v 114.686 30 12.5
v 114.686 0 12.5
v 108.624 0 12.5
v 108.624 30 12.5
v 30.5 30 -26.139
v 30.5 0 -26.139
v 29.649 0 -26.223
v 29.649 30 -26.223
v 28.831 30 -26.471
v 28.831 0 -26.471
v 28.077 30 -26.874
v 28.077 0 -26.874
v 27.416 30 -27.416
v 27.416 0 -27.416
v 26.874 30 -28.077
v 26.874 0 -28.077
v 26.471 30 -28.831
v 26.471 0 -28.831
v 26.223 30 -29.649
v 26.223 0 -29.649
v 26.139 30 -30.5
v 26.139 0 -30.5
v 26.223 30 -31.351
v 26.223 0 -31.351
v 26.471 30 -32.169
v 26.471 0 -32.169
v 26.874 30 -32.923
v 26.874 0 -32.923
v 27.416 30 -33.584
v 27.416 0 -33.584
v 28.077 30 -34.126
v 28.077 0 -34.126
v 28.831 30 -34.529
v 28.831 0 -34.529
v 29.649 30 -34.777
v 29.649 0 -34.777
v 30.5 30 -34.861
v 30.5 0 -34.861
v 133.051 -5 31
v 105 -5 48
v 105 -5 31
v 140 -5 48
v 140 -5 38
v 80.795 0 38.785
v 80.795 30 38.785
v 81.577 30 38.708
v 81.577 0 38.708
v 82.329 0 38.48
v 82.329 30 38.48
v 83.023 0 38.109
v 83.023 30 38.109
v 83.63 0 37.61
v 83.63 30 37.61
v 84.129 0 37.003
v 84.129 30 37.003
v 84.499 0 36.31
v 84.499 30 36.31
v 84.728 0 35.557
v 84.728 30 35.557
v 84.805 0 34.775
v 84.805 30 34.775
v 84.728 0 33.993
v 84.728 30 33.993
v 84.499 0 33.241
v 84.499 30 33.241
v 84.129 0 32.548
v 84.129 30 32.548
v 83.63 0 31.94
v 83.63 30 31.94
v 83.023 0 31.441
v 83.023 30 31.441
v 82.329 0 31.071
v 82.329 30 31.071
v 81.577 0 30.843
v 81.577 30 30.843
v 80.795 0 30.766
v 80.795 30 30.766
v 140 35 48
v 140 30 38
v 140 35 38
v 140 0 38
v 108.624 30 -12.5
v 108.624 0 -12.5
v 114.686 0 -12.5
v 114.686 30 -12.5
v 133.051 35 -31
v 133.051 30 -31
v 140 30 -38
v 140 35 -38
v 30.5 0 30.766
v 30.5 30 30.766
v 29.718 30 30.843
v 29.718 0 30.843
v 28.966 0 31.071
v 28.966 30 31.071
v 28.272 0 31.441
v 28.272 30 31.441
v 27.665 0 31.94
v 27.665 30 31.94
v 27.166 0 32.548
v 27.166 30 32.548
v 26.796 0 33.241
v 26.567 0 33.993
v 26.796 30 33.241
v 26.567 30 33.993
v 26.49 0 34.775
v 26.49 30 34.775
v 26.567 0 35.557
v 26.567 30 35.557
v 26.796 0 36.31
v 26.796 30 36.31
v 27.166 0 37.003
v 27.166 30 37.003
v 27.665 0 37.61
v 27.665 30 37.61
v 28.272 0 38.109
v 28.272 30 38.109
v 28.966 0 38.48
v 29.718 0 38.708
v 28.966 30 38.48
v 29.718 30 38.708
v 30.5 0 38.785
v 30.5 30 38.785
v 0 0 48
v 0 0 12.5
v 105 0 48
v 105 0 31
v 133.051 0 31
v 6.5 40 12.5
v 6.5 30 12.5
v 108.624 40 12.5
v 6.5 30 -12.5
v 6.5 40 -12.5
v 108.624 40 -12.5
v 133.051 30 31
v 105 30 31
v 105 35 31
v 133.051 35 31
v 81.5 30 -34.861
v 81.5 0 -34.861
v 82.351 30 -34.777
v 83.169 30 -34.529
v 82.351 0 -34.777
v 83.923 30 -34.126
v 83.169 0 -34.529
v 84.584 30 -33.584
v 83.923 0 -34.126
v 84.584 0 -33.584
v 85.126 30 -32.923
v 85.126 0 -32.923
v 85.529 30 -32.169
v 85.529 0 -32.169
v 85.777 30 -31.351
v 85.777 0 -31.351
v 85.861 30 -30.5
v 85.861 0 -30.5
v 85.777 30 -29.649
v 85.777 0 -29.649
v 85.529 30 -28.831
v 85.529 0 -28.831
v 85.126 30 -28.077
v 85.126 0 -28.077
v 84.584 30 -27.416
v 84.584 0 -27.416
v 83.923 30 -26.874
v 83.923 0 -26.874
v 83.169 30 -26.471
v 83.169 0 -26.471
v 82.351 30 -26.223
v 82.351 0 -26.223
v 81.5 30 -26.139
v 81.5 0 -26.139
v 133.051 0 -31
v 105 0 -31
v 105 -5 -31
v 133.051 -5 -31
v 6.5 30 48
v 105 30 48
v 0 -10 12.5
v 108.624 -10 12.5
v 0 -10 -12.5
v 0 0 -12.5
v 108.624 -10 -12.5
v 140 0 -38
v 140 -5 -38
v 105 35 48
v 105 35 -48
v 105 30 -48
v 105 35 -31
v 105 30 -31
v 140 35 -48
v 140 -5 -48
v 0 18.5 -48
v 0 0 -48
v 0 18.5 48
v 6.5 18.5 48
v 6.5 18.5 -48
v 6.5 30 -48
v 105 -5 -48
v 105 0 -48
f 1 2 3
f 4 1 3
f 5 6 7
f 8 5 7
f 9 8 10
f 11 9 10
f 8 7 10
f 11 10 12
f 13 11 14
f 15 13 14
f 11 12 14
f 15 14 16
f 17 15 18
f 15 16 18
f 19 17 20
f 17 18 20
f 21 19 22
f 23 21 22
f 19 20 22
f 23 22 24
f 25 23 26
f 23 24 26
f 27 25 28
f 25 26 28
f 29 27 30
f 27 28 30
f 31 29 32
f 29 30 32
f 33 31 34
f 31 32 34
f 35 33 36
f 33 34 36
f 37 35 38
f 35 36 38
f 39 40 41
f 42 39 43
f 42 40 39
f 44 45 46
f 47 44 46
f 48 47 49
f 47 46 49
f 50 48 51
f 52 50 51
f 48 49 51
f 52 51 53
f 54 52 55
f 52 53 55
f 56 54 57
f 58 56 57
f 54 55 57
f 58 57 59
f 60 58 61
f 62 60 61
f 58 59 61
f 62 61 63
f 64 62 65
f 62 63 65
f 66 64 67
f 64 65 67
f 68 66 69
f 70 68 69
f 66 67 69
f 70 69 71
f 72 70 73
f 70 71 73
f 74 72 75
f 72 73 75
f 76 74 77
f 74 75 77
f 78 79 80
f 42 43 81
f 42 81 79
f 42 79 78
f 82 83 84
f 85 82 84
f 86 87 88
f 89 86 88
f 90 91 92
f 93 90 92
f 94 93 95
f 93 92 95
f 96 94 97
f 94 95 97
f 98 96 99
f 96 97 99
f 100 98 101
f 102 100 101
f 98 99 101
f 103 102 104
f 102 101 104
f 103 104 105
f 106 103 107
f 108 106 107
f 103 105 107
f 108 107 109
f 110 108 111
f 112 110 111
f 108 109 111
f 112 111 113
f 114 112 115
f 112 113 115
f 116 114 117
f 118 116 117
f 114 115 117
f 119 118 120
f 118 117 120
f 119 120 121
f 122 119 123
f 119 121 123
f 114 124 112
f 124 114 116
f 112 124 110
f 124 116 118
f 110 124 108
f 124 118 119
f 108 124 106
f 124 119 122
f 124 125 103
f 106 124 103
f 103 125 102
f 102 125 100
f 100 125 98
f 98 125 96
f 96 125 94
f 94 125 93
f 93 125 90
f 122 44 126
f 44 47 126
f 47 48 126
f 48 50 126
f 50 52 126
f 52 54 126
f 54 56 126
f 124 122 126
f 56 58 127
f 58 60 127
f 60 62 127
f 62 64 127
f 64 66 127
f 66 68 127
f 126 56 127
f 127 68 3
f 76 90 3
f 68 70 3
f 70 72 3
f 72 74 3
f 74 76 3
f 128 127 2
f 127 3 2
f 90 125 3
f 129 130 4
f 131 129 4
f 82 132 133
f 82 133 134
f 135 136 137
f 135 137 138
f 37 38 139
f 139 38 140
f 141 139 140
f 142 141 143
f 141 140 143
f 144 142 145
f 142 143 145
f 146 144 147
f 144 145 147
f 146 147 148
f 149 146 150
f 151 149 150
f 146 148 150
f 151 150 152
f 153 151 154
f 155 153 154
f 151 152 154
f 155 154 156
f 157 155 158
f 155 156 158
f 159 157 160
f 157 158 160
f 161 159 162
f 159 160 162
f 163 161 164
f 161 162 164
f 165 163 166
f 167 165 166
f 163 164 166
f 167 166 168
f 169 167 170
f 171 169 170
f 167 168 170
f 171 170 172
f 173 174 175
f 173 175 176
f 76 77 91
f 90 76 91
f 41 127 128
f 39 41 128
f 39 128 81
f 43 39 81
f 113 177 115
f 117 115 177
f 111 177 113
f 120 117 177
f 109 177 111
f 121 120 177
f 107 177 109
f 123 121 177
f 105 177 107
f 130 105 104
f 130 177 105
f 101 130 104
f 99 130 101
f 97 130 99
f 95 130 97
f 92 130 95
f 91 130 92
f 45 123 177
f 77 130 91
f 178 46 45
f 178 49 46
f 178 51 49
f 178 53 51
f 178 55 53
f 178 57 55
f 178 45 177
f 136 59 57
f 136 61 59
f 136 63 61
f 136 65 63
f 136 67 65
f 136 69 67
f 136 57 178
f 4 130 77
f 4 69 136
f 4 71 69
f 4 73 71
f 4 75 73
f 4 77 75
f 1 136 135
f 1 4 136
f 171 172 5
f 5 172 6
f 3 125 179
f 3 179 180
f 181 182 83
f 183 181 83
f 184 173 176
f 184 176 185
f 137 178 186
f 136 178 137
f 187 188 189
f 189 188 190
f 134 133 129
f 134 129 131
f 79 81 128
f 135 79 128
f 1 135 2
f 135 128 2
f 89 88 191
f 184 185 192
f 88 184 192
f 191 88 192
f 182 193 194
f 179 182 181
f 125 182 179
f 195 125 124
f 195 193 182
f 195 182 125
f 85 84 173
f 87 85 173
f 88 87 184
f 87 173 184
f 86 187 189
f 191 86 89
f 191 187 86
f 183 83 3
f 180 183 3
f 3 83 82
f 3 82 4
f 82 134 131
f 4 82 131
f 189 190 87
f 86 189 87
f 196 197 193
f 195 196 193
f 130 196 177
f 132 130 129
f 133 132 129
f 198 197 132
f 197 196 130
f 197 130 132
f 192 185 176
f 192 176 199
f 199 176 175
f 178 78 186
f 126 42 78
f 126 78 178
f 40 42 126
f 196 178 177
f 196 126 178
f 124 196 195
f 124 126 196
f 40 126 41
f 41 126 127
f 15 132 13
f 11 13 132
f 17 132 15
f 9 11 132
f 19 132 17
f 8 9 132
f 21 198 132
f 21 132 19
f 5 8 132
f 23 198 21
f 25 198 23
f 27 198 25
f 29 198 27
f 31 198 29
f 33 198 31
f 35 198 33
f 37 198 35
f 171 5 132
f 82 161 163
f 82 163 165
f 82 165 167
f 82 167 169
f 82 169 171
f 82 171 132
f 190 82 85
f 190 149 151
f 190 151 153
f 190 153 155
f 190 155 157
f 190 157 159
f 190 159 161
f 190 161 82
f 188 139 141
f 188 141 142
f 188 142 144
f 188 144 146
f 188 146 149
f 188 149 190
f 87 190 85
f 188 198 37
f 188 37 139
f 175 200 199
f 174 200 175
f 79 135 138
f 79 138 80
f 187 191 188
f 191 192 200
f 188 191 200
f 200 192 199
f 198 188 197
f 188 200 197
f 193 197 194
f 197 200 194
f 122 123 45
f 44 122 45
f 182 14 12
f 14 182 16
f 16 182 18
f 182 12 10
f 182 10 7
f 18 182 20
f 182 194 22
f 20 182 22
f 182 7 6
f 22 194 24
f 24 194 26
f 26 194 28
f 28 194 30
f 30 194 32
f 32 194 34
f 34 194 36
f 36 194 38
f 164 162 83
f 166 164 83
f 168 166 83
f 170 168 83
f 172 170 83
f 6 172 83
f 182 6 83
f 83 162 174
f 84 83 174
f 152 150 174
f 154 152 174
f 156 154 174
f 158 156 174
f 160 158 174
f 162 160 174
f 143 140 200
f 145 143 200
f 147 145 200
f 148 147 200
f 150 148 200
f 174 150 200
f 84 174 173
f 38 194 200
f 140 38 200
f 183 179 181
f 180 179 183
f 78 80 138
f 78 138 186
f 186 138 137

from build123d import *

# Parameters (mm, degrees)
BOSS_EXTRUDE3_DEPTH     = 30
SKETCH3_W               = 108.623523344
SKETCH3_H               = 25
BOSS_EXTRUDE4_DEPTH     = 10
CUT_EXTRUDE2_DEPTH      = 152.009933448
CUT_EXTRUDE2_DEPTH_BACK = 152.009933448
SKETCH5_W               = 108.623523344
SKETCH5_H               = 25
BOSS_EXTRUDE5_DEPTH     = 10
CUT_EXTRUDE3_DEPTH      = 154.310143174
CUT_EXTRUDE3_DEPTH_BACK = 154.310143174
BOSS_EXTRUDE6_DEPTH     = 5
BOSS_EXTRUDE7_DEPTH     = 5
BOSS_EXTRUDE8_DEPTH     = 5
CUT_EXTRUDE4_REACH      = 176.402
SKETCH22_W              = 6.5
SKETCH22_H              = 11.5
SKETCH23_W              = 6.5
SKETCH23_H              = 10
CUT_EXTRUDE5_DEPTH      = 158.671335378


with BuildPart() as part:
    # Sketch1 → Boss-Extrude3 (new body)
    with BuildSketch(Plane(origin=(0, 0, 0), x_dir=(1, 0, 0), z_dir=(0, 1, 0))):
        Polygon((0, -48), (105, -48), (140, -48), (140, -38), (114.68589492, -12.5), (108.623523344, -12.5), (108.623523344, 12.5), (114.68589492, 12.5), (140, 38), (140, 48), (0, 48), align=None)
    extrude(amount=BOSS_EXTRUDE3_DEPTH)

    # Sketch3 → Boss-Extrude4 (add)
    with BuildSketch(Plane(origin=(0, 30, 0), x_dir=(1, 0, 0), z_dir=(0, 1, 0))):
        with Locations((54.311761672, 0)):
            Rectangle(SKETCH3_W, SKETCH3_H)
    extrude(amount=BOSS_EXTRUDE4_DEPTH)

    # Sketch4 → Cut-Extrude2 (cut, two sides: drawn at the far end of the back side and taken through both)
    with BuildSketch(Plane(origin=(0, 30, 0), x_dir=(1, 0, 0), z_dir=(0, 1, 0)).offset(-CUT_EXTRUDE2_DEPTH_BACK)):
        with BuildLine():
            Line((30.5, 34.860728985), (81.5, 34.860728985))
            ThreePointArc((81.5, 34.860728985), (85.860728985, 30.5), (81.5, 26.139271015))
            Line((81.5, 26.139271015), (30.5, 26.139271015))
            ThreePointArc((30.5, 26.139271015), (26.139271015, 30.5), (30.5, 34.860728985))
        make_face()
    extrude(amount=CUT_EXTRUDE2_DEPTH + CUT_EXTRUDE2_DEPTH_BACK, mode=Mode.SUBTRACT)

    # Sketch5 → Boss-Extrude5 (add)
    with BuildSketch(Plane.XZ):
        with Locations((54.311761672, 0)):
            Rectangle(SKETCH5_W, SKETCH5_H)
    extrude(amount=BOSS_EXTRUDE5_DEPTH)

    # Sketch6 → Cut-Extrude3 (cut, two sides: drawn at the far end of the back side and taken through both)
    with BuildSketch(Plane.XZ.offset(-CUT_EXTRUDE3_DEPTH_BACK)):
        with BuildLine():
            Line((30.5, 38.784818055), (80.79497918, 38.784818055))
            ThreePointArc((80.79497918, 38.784818055), (84.804542876, 34.77525436), (80.79497918, 30.765690664))
            Line((80.79497918, 30.765690664), (30.5, 30.765690664))
            ThreePointArc((30.5, 30.765690664), (26.490436304, 34.77525436), (30.5, 38.784818055))
        make_face()
    extrude(amount=CUT_EXTRUDE3_DEPTH + CUT_EXTRUDE3_DEPTH_BACK, mode=Mode.SUBTRACT)

    # Sketch10 → Boss-Extrude6 (add)
    with BuildSketch(Plane(origin=(0, 30, 0), x_dir=(1, 0, 0), z_dir=(0, 1, 0))):
        Polygon((140, 48), (105, 48), (105, 31), (133.051029978, 31), (140, 38), align=None)
    extrude(amount=BOSS_EXTRUDE6_DEPTH)

    # Sketch12 → Boss-Extrude7 (add)
    with BuildSketch(Plane.XZ):
        Polygon((140, 48), (105, 48), (105, 31), (133.051029978, 31), (140, 38), align=None)
        Polygon((105, -48), (105, -31), (133.051029978, -31), (140, -38), (140, -48), align=None)
    extrude(amount=BOSS_EXTRUDE7_DEPTH)

    # Sketch13 → Boss-Extrude8 (add)
    with BuildSketch(Plane(origin=(0, 30, 0), x_dir=(1, 0, 0), z_dir=(0, 1, 0))):
        Polygon((105, -48), (105, -31), (133.051029978, -31), (140, -38), (140, -48), align=None)
    extrude(amount=BOSS_EXTRUDE8_DEPTH)

    # Sketch22 → Cut-Extrude4 (cut, up to next)
    with BuildSketch(Plane(origin=(0, 0, -48), x_dir=(-1, 0, 0), z_dir=(0, 0, -1)), mode=Mode.PRIVATE) as cut_extrude4_sk1:
        with Locations((-3.25, 24.25)):
            Rectangle(SKETCH22_W, SKETCH22_H)
    cut_extrude4_tool1 = extrude(cut_extrude4_sk1.sketch, amount=-CUT_EXTRUDE4_REACH, mode=Mode.PRIVATE) & part.part
    add(cut_extrude4_tool1.solids().sort_by_distance((3.25, 24.25, -48))[0], mode=Mode.SUBTRACT)

    # Sketch23 → Cut-Extrude5 (cut, through all)
    with BuildSketch(Plane(origin=(0, 0, -12.5), x_dir=(-1, 0, 0), z_dir=(0, 0, -1))):
        with Locations((-3.25, 35)):
            Rectangle(SKETCH23_W, SKETCH23_H)
    extrude(amount=-CUT_EXTRUDE5_DEPTH, mode=Mode.SUBTRACT)


solid = part.part
